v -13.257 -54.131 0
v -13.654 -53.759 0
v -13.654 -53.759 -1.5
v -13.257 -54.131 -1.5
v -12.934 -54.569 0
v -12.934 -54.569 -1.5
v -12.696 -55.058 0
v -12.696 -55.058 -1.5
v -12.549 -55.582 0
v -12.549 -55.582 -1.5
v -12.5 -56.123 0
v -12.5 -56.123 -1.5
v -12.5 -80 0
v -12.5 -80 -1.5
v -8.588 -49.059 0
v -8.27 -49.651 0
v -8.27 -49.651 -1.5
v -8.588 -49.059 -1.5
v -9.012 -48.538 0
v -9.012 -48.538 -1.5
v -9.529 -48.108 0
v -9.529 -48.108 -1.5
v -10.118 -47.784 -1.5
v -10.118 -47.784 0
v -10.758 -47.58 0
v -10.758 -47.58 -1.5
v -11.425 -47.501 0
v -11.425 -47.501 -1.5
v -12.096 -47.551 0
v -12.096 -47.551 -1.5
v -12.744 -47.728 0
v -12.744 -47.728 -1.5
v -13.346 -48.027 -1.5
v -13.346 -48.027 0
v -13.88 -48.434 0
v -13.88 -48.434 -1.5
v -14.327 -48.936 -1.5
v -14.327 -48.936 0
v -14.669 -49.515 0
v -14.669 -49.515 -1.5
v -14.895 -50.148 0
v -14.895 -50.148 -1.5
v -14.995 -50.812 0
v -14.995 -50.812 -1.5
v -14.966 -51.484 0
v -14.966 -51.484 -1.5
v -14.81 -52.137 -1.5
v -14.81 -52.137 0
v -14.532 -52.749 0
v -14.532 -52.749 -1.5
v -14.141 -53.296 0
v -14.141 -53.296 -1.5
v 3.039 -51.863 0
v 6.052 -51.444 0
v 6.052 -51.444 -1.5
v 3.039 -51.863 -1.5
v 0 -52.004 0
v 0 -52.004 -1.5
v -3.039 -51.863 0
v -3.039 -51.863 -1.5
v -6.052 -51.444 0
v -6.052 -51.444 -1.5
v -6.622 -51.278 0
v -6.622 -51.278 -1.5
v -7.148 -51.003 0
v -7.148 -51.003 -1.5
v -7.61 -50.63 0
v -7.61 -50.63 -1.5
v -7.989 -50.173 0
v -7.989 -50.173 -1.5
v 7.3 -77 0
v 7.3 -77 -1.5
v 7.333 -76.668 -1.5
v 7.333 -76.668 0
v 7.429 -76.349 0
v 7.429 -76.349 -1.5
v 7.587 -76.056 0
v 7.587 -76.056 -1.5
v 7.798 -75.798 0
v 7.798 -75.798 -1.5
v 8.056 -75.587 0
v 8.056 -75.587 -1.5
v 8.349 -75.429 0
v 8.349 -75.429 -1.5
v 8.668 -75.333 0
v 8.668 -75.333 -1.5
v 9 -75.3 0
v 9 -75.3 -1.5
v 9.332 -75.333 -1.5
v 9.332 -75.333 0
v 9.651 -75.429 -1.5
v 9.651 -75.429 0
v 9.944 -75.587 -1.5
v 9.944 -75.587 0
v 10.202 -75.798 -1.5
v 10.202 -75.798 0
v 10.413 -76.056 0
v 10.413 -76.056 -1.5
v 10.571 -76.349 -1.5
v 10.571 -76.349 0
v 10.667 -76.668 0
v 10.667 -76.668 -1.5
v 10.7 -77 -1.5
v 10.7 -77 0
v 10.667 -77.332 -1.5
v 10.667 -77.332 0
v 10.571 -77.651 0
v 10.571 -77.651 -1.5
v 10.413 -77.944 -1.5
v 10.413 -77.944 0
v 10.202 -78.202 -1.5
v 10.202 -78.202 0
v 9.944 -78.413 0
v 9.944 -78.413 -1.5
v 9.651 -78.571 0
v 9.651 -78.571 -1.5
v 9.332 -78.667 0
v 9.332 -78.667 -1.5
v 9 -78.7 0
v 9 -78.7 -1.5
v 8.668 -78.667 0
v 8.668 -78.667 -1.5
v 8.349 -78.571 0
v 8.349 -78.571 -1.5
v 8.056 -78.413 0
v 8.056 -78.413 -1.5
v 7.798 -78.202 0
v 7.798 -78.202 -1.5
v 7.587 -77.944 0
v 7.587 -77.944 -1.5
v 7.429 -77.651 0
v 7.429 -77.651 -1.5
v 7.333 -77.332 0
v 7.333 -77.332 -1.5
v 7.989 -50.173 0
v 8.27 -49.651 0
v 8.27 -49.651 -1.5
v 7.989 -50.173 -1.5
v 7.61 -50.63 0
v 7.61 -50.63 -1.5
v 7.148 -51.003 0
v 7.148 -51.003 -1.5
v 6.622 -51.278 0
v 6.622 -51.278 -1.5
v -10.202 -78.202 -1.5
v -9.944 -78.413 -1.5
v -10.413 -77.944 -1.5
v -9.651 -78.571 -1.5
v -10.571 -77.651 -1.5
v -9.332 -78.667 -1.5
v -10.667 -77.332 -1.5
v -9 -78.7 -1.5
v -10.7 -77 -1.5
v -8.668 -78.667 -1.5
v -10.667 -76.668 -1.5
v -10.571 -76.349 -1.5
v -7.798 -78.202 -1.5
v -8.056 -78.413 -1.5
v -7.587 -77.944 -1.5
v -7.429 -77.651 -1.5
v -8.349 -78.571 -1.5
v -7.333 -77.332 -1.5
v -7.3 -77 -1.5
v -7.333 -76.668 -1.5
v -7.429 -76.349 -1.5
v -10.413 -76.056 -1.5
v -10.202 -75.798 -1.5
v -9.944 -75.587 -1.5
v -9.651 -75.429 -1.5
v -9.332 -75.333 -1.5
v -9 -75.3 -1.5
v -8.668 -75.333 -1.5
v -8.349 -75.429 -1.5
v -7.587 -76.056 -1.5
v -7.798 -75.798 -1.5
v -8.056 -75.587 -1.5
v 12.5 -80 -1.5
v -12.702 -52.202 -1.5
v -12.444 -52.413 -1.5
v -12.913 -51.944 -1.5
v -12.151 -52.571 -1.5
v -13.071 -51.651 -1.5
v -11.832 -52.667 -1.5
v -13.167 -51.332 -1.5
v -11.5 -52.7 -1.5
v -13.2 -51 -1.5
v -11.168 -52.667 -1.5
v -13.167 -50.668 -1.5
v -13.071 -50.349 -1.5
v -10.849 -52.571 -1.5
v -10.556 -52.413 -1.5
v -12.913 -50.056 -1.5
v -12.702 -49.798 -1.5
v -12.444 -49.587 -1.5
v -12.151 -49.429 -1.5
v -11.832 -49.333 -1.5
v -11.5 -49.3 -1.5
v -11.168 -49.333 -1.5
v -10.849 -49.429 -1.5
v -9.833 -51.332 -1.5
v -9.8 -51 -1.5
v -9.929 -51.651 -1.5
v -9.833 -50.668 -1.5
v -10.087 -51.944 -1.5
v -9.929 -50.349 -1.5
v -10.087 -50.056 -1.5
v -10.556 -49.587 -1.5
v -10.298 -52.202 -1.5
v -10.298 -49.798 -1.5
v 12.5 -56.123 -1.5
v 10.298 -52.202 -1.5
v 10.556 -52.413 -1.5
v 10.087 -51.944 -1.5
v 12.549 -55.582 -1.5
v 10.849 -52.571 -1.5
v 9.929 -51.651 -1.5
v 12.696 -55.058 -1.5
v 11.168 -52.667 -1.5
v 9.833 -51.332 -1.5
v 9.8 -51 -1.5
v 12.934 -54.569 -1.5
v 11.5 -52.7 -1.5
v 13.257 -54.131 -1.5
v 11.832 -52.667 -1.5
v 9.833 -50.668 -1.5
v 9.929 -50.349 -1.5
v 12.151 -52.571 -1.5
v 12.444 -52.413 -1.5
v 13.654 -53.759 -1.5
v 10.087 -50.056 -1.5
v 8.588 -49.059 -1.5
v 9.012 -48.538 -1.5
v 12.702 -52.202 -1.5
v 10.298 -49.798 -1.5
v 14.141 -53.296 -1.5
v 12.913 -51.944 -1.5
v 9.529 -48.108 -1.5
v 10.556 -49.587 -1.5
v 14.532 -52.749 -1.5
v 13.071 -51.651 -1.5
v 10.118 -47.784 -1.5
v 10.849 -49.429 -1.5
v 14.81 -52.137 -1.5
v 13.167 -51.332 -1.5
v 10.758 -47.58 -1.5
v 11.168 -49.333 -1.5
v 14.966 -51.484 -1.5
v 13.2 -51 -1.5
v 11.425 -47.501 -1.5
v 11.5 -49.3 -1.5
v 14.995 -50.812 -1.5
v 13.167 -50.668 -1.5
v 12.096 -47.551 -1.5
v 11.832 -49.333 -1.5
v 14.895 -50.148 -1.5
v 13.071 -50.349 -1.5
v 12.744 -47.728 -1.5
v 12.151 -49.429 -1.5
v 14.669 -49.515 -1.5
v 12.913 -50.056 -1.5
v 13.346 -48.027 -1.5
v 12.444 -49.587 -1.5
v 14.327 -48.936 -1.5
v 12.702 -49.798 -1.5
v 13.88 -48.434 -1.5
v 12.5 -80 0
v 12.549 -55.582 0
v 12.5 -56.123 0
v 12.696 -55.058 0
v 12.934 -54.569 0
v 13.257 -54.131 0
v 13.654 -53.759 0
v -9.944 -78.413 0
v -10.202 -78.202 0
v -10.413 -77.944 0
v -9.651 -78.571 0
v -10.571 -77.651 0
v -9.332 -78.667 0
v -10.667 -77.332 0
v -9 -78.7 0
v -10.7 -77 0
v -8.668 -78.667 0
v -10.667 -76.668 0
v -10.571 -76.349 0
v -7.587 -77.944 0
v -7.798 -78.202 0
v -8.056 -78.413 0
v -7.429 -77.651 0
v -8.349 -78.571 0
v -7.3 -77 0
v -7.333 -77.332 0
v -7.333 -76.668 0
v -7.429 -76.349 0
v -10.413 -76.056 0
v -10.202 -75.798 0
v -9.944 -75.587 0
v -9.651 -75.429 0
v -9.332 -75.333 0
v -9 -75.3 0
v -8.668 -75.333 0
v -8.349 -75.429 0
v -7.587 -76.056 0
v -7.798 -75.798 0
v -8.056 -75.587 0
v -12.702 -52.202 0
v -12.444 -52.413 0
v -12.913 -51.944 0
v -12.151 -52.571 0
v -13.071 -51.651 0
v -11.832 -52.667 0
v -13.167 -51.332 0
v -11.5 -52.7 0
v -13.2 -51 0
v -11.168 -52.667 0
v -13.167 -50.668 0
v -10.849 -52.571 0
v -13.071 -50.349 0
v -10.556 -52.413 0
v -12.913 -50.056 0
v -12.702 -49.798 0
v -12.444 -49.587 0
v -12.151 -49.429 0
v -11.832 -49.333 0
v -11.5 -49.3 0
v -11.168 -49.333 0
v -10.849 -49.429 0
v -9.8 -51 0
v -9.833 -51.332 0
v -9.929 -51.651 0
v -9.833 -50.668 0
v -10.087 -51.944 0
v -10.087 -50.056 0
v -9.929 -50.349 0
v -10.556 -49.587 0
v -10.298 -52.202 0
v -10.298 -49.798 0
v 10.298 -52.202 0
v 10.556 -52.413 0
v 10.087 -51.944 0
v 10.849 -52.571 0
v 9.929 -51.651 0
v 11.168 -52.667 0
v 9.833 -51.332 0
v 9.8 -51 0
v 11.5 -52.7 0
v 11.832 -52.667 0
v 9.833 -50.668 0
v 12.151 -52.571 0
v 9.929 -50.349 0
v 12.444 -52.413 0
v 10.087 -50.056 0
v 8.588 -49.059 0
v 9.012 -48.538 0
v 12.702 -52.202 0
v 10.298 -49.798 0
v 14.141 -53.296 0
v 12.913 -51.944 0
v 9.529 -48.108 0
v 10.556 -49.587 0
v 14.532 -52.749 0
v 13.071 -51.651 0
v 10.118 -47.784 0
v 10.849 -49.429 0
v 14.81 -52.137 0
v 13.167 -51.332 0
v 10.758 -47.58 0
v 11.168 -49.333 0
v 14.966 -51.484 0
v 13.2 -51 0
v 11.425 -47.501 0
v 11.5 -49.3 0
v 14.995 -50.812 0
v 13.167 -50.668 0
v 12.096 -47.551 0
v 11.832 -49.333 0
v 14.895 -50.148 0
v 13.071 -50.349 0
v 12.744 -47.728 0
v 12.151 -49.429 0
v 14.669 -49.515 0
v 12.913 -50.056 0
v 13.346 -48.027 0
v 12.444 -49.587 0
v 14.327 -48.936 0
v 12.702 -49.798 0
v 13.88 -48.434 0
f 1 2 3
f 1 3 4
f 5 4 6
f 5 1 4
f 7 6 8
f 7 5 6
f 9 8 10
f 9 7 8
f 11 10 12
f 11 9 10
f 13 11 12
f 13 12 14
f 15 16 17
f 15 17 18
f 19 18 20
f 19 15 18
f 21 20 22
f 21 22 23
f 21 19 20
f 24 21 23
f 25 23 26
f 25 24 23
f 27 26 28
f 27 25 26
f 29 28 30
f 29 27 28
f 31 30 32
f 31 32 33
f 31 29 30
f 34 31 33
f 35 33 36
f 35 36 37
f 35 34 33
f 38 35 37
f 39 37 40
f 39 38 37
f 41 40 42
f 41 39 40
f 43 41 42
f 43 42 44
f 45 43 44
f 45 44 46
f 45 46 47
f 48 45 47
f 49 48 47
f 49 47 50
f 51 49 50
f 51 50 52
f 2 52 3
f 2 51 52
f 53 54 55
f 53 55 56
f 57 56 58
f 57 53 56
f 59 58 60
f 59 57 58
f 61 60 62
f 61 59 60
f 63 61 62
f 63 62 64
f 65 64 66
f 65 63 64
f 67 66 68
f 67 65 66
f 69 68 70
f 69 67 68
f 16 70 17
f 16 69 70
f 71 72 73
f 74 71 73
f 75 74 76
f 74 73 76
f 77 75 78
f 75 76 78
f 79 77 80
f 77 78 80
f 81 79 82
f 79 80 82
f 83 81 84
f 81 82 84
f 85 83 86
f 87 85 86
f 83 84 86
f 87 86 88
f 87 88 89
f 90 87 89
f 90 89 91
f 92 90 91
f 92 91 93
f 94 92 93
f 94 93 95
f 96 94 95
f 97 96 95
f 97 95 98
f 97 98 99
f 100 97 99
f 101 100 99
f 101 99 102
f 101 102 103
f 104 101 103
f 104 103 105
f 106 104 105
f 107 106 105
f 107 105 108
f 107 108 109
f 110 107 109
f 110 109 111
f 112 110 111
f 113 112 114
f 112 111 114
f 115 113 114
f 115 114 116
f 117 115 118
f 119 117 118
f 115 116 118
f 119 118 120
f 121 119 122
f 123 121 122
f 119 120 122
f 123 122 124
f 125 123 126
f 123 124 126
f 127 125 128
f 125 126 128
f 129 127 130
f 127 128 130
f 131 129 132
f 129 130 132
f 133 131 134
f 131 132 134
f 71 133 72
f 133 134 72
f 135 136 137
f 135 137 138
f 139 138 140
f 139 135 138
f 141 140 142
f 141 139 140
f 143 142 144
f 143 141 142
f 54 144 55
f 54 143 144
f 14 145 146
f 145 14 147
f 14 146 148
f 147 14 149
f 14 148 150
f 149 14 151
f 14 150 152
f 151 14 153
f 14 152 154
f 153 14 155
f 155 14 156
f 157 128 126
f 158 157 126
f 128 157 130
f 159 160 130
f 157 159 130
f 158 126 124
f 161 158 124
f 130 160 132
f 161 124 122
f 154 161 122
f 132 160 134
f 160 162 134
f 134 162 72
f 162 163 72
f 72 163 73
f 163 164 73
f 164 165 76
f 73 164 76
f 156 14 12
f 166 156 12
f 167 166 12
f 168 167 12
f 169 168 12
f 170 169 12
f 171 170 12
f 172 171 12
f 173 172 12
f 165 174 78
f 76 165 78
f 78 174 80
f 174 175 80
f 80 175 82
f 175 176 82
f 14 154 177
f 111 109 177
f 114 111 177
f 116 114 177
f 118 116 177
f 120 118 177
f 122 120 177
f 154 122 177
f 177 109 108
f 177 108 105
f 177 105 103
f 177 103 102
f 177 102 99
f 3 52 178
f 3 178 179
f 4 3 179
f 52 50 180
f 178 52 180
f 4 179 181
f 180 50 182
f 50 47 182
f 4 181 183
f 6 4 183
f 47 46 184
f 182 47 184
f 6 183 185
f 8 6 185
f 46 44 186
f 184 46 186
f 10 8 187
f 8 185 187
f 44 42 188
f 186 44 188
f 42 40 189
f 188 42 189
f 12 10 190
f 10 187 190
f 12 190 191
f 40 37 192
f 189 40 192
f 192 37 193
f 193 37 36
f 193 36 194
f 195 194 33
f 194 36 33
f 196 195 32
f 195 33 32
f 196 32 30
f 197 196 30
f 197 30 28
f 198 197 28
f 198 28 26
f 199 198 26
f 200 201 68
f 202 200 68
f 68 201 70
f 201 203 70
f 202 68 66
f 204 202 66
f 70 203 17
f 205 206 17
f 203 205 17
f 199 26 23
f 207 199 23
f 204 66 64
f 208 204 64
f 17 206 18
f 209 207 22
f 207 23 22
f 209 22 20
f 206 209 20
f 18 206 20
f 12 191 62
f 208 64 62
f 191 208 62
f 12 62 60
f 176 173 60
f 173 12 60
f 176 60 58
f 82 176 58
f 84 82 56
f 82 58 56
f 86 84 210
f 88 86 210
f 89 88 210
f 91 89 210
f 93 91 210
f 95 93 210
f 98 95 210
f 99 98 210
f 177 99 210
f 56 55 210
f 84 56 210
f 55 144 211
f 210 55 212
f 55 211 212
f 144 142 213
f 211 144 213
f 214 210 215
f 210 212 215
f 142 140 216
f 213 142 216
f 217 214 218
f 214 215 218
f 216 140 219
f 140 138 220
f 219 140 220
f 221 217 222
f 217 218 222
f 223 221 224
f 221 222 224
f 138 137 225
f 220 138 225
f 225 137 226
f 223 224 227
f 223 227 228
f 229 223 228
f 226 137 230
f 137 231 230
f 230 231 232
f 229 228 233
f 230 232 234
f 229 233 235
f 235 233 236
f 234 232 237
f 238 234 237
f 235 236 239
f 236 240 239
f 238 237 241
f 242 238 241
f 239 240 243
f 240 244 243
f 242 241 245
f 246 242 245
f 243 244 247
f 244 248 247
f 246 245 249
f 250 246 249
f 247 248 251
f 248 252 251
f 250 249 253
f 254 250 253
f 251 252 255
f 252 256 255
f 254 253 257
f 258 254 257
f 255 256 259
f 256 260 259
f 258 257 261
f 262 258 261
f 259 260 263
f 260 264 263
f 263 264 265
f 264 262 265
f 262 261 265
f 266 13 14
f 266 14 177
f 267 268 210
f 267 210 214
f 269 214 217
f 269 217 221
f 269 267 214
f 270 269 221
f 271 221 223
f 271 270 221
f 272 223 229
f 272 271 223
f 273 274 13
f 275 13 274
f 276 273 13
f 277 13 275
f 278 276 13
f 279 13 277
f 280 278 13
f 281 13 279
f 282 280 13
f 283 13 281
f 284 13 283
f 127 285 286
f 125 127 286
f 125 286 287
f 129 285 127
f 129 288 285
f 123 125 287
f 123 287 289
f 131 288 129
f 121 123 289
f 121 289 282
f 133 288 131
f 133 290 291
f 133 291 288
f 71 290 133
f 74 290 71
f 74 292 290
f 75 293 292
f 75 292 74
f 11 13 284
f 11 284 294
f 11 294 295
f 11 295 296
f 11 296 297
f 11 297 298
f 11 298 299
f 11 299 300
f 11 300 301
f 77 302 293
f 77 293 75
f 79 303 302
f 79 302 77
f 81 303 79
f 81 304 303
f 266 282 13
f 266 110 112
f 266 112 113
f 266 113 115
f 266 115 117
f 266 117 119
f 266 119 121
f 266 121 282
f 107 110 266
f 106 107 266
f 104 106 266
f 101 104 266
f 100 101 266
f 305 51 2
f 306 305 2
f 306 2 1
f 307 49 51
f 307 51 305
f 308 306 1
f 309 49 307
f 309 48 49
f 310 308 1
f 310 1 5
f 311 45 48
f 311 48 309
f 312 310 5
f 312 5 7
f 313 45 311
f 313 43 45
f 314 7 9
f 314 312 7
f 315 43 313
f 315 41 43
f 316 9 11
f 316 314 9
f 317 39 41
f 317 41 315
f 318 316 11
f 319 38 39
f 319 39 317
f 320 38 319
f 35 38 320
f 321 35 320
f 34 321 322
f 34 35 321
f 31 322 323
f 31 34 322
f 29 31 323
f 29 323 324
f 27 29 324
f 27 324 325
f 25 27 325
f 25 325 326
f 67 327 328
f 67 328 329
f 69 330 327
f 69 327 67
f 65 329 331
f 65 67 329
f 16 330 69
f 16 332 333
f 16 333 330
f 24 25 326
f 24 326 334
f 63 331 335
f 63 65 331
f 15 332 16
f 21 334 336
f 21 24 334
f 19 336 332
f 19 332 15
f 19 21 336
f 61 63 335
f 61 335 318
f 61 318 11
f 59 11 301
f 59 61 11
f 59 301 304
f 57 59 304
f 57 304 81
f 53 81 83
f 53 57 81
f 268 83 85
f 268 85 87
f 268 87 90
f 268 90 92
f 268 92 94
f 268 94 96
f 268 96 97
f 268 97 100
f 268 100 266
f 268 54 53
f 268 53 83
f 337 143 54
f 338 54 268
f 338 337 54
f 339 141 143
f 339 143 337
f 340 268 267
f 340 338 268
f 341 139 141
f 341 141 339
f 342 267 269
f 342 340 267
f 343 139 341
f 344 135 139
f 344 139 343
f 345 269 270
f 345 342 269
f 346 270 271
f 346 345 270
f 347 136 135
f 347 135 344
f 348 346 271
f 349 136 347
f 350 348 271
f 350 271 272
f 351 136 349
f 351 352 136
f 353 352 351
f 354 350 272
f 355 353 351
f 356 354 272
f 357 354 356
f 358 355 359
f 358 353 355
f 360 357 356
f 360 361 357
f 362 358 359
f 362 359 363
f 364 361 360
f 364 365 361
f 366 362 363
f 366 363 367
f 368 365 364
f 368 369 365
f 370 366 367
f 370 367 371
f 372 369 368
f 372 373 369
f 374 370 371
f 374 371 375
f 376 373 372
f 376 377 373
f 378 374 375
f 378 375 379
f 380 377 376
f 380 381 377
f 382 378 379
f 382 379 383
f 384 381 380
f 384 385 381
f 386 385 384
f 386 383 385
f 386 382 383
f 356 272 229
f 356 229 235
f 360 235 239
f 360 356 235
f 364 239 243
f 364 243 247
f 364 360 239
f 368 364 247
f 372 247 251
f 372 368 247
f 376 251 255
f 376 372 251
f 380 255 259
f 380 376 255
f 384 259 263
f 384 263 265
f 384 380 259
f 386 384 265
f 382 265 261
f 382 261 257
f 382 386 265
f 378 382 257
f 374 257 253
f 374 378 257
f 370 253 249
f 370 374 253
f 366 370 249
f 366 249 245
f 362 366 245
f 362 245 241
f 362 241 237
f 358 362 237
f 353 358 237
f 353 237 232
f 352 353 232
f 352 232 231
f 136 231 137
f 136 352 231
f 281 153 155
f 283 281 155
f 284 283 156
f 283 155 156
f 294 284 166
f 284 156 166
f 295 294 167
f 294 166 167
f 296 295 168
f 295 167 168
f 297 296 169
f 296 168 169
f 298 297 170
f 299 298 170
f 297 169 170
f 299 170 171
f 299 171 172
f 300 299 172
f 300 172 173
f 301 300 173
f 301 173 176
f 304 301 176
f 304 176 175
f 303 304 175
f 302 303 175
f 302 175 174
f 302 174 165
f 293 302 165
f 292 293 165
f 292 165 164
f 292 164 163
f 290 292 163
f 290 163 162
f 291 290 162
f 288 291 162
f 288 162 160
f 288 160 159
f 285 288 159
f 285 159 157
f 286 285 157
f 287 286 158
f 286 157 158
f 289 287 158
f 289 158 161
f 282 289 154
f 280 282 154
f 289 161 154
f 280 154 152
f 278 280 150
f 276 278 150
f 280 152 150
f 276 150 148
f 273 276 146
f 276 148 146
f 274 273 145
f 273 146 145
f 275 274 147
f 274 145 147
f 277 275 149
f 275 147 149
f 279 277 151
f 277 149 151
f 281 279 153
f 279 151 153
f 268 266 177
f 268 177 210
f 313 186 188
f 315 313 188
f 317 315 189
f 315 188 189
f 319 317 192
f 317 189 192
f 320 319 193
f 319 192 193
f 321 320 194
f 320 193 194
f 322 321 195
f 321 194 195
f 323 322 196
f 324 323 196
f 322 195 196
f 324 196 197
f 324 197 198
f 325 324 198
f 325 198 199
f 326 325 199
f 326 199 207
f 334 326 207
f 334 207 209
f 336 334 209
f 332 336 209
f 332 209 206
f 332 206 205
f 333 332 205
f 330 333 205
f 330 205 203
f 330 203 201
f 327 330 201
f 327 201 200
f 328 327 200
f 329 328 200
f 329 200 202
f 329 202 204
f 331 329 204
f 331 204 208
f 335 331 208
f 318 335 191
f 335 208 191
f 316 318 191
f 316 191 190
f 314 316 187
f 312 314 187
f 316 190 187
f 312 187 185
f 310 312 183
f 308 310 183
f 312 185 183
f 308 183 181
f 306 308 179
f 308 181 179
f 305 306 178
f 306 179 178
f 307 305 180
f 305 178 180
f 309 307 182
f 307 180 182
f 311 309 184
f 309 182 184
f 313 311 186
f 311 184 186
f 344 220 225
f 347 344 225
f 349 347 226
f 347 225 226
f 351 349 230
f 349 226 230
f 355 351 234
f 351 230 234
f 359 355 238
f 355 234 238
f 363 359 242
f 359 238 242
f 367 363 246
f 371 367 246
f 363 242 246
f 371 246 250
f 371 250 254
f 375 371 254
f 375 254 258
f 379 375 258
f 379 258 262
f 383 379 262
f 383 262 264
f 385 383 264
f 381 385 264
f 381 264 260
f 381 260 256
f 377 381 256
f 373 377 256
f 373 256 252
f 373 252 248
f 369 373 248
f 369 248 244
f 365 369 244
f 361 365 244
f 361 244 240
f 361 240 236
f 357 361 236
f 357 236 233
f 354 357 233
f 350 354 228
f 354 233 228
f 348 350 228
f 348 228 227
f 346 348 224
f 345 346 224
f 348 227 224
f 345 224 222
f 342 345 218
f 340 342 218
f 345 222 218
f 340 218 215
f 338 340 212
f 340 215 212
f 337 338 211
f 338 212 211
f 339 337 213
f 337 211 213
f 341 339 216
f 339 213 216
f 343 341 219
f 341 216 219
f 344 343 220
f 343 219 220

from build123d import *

# Parameters (mm, degrees)
EXTRUDE_1_DEPTH       = 1.5
HOLE_WIZARD_M31_D     = 3.4
HOLE_WIZARD_M31_DEPTH = 1.5


with BuildPart() as part:
    # Эскиз1 → Бобышка-Вытянуть1 (new body)
    with BuildSketch(Plane.XY):
        with BuildLine():
            Line((-12.5, -56.123475383), (-12.5, -80))
            Line((-12.5, -80), (12.5, -80))
            Line((12.5, -80), (12.5, -56.123475383))
            ThreePointArc((12.5, -56.123475383), (12.803848897, -54.807888354), (13.653846154, -53.758794437))
            ThreePointArc((13.653846154, -53.758794437), (13.623122203, -48.217491759), (8.270384407, -49.651080759))
            ThreePointArc((8.270384407, -49.651080759), (7.388025887, -50.827983152), (6.0522893, -51.4439893))
            ThreePointArc((6.0522893, -51.4439893), (0, -52.003676272), (-6.0522893, -51.4439893))
            ThreePointArc((-6.0522893, -51.4439893), (-7.388025887, -50.827983152), (-8.270384407, -49.651080759))
            ThreePointArc((-8.270384407, -49.651080759), (-13.623122203, -48.217491759), (-13.653846154, -53.758794437))
            ThreePointArc((-13.653846154, -53.758794437), (-12.803848897, -54.807888354), (-12.5, -56.123475383))
        make_face()
    extrude(amount=-EXTRUDE_1_DEPTH)

    # Отверстие с зазором M31
    with Locations(Plane.XY):
        with Locations((11.5, -51), (-11.5, -51), (9, -77), (-9, -77)):
            Hole(HOLE_WIZARD_M31_D / 2, depth=HOLE_WIZARD_M31_DEPTH)


solid = part.part
